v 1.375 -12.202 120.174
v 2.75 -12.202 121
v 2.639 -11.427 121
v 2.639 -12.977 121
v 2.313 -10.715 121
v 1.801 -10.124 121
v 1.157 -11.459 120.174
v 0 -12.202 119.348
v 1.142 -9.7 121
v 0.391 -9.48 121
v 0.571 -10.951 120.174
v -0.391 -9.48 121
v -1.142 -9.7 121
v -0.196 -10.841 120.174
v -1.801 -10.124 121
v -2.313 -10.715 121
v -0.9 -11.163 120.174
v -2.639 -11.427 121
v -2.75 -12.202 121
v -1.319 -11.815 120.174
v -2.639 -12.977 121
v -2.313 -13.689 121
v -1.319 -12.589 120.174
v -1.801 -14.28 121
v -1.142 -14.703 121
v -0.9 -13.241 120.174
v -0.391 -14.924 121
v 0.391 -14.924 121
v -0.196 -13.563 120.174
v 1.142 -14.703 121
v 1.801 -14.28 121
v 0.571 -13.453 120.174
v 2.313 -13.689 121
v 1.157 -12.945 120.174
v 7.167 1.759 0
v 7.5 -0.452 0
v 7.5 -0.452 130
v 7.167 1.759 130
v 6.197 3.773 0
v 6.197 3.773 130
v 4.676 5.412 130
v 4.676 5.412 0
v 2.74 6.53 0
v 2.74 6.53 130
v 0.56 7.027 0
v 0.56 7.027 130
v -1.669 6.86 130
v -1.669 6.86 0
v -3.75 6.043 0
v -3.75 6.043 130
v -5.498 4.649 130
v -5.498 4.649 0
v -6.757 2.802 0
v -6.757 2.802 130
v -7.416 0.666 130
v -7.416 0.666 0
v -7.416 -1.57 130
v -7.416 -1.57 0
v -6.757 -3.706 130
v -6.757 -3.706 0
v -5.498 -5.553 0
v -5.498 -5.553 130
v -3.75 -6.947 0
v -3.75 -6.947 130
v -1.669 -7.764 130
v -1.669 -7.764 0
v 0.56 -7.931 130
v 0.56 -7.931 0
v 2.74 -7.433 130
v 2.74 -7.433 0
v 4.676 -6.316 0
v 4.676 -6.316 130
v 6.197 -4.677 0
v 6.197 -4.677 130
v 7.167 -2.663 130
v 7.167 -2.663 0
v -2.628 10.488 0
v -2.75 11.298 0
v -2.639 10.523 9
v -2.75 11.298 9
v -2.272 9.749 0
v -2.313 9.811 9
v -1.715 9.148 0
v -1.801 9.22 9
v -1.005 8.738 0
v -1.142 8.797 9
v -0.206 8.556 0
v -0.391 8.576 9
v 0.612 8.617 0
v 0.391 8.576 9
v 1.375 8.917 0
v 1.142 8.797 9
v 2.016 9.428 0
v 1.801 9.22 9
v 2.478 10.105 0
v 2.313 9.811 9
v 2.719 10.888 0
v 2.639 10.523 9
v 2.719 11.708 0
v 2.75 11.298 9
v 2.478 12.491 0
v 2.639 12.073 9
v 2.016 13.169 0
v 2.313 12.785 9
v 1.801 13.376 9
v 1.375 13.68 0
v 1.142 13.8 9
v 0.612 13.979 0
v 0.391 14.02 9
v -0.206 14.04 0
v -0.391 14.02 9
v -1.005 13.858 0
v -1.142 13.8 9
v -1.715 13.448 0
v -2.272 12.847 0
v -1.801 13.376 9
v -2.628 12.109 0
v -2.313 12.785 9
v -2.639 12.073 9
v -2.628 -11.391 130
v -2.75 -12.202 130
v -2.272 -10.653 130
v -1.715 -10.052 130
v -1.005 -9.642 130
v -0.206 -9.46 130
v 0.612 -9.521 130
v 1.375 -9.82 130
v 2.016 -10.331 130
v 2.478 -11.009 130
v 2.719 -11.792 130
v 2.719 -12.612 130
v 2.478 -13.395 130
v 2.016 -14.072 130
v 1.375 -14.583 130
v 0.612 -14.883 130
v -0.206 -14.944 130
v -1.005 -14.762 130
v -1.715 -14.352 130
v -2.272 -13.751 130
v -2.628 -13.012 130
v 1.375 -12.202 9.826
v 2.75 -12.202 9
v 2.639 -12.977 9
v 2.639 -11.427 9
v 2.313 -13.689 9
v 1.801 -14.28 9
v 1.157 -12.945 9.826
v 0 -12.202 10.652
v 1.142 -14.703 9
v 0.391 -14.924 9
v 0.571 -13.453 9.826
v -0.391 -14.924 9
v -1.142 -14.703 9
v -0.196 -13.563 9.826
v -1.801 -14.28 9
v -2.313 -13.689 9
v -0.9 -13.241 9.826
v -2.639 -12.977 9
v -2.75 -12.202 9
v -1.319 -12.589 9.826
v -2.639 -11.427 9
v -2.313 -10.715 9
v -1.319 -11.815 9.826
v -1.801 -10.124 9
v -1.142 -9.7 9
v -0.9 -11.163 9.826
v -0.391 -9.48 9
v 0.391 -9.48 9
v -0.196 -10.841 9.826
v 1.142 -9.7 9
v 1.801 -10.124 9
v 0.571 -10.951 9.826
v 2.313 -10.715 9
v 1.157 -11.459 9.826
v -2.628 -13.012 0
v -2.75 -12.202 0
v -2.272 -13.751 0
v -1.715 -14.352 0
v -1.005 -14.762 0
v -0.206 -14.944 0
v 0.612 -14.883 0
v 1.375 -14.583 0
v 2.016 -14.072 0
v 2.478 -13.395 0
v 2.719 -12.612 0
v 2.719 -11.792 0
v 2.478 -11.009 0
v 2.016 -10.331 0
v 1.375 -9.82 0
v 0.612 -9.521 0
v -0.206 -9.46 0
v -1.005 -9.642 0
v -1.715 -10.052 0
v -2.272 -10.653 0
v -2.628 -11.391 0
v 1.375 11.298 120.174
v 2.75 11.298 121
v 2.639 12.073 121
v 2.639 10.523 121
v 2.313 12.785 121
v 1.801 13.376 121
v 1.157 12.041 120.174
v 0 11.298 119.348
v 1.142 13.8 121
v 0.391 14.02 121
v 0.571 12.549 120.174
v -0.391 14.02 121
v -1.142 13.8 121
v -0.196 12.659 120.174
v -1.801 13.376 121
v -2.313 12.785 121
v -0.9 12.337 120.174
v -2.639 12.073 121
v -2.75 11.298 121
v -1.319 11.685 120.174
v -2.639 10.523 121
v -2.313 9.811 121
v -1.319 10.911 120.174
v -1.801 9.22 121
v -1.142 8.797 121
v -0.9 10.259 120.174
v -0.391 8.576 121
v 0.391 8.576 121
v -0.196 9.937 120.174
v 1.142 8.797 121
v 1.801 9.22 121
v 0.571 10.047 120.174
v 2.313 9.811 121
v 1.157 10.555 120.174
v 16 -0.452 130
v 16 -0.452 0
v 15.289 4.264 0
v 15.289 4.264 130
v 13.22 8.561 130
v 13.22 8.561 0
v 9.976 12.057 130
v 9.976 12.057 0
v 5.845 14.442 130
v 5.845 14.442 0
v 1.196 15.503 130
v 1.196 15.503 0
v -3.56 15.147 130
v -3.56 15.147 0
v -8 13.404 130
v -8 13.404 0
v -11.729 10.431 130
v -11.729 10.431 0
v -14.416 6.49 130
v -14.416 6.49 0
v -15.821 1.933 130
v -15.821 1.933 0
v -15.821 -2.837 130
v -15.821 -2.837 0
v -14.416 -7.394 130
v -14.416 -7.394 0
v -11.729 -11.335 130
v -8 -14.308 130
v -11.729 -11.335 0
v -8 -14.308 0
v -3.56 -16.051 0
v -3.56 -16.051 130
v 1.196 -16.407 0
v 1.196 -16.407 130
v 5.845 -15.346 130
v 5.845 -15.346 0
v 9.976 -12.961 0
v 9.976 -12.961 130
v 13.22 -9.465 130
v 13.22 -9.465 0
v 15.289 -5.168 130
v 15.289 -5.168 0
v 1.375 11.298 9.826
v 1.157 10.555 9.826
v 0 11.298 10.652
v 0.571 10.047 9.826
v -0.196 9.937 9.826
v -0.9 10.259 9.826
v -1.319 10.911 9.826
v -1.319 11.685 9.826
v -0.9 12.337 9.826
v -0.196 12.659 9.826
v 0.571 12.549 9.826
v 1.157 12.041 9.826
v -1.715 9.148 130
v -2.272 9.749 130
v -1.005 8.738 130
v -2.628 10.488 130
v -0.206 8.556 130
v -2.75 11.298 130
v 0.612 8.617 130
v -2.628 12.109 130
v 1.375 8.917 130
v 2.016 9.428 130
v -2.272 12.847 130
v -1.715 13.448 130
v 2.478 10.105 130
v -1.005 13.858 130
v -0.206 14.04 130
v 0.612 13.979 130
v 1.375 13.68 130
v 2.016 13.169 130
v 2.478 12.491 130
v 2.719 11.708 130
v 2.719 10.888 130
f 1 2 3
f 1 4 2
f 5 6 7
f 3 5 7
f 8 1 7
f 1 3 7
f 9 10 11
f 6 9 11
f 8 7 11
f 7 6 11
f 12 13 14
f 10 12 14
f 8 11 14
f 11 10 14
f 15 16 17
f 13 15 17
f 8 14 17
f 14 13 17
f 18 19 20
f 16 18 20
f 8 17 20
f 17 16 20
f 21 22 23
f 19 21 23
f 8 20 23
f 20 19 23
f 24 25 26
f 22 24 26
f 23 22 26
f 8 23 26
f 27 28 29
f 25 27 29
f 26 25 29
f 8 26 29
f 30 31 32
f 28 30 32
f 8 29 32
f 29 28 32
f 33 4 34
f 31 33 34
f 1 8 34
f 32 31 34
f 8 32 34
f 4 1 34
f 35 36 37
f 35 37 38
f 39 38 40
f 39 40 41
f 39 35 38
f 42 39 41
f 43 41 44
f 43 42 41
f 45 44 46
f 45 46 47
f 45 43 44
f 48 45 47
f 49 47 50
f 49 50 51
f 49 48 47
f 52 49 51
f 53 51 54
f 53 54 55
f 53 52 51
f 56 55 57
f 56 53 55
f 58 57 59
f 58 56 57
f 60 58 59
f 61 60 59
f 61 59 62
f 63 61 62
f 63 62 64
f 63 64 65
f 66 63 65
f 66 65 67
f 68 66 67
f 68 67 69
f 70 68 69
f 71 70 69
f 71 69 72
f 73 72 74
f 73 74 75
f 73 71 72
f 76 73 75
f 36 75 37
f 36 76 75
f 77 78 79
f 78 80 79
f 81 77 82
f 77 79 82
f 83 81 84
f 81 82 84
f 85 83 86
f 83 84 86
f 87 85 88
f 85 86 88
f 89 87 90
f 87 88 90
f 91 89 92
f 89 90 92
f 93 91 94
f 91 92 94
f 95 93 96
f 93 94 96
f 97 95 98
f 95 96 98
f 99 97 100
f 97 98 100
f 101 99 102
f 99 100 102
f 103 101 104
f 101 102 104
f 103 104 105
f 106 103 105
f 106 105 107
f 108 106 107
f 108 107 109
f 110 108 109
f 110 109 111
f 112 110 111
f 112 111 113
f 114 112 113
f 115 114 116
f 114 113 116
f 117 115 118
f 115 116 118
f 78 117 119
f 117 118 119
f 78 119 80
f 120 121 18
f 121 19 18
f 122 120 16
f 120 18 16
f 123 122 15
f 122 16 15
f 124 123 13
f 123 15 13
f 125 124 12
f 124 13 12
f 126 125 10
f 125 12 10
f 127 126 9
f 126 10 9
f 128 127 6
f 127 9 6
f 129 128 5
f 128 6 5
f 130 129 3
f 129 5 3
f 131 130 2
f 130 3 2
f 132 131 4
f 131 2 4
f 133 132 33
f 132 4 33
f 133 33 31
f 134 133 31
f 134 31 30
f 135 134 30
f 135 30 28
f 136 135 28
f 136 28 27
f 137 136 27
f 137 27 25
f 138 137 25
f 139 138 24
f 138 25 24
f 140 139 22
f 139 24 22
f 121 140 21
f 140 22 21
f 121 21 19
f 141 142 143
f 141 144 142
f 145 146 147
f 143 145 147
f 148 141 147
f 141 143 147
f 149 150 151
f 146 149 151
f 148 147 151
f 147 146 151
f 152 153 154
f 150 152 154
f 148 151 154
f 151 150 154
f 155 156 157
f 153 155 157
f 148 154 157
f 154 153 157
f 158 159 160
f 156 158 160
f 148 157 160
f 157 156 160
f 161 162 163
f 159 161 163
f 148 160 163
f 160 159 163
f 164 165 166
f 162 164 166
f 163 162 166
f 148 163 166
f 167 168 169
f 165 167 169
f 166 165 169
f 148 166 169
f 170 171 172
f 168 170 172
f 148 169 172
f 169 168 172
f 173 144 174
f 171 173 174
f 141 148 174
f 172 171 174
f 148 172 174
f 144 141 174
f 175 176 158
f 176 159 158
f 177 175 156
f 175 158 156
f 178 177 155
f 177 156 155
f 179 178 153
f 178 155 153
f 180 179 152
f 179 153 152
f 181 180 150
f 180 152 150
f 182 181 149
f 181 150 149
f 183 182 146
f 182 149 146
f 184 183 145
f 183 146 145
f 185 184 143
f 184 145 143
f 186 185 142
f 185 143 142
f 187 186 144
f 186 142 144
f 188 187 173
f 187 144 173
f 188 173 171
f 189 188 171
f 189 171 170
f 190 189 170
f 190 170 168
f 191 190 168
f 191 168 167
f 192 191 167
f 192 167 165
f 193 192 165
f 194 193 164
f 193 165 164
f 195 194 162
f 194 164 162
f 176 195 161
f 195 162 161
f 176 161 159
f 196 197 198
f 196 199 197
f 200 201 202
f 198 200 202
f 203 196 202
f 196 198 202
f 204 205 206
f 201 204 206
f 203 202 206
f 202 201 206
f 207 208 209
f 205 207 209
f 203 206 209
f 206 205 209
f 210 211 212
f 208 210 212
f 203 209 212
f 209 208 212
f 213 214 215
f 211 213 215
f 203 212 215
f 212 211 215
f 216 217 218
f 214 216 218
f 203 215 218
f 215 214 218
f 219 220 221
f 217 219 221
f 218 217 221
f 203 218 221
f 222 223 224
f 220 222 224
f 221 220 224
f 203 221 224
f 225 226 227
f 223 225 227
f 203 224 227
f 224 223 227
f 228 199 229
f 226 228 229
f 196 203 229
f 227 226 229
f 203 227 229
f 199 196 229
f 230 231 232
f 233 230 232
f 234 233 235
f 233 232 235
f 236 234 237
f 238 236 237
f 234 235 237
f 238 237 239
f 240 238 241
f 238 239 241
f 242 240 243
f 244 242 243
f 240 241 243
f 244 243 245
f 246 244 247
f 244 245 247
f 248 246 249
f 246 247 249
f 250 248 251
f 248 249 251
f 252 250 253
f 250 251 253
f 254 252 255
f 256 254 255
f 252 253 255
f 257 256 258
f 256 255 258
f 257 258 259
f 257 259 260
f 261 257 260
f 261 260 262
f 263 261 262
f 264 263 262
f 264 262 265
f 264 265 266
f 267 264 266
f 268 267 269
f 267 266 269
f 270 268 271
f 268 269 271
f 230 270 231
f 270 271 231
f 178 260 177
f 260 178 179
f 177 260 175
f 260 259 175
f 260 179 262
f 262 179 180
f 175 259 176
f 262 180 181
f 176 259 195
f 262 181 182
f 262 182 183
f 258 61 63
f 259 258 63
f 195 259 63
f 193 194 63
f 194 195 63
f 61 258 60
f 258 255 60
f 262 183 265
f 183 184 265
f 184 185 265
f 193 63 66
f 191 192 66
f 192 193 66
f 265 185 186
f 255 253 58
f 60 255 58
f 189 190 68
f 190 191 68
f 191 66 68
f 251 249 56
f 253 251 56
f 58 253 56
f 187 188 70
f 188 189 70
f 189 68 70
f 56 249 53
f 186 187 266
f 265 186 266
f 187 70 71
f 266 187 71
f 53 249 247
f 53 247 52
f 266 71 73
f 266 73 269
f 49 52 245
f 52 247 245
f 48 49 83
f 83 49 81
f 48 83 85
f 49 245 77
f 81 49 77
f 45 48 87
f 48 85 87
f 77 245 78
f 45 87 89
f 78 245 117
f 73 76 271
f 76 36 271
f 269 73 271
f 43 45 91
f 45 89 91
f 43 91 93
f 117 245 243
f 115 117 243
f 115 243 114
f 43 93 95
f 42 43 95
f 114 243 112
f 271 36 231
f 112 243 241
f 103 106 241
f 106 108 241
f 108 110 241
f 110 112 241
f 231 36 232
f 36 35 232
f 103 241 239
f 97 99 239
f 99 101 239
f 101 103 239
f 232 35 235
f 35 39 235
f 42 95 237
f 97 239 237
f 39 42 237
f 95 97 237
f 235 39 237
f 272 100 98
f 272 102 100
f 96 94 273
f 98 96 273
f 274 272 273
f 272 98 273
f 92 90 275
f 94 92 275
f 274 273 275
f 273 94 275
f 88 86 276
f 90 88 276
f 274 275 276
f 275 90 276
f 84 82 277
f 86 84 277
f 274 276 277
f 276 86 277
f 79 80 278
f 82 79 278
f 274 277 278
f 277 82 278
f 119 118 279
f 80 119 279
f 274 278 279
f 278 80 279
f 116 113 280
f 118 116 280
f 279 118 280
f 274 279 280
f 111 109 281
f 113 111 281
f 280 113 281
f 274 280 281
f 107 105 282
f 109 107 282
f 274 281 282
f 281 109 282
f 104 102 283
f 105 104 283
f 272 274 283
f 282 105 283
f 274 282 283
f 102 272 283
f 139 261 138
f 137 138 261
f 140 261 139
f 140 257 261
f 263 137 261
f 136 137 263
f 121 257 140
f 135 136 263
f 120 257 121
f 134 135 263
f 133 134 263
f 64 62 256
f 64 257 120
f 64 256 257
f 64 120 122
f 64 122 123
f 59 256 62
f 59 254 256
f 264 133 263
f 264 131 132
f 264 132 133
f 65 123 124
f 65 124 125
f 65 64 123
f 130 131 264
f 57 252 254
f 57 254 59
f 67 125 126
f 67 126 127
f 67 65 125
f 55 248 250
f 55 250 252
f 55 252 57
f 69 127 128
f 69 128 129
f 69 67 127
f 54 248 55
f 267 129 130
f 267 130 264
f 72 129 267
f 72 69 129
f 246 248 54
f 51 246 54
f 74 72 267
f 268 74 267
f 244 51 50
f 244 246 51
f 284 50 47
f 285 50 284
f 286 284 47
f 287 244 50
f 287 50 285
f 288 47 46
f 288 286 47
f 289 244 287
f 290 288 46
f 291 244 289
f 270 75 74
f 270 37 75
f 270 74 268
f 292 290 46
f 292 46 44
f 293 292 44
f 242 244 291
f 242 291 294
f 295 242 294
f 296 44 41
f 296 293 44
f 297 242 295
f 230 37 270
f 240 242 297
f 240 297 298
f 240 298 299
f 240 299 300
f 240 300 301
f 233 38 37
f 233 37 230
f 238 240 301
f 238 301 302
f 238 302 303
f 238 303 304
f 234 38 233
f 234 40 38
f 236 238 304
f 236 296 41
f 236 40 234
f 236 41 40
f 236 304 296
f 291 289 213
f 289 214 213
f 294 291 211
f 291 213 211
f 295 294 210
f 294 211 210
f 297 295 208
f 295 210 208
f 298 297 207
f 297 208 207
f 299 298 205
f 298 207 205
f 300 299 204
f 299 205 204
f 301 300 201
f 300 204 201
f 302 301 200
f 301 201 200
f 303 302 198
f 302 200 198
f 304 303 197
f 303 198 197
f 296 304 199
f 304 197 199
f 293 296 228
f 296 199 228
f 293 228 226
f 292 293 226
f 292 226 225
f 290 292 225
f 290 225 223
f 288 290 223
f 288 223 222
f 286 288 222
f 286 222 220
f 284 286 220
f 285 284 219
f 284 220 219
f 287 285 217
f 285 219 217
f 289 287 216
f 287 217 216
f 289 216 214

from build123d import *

# Parameters (mm, degrees)
F0_R     = 16
F0_R_2   = 7.5
F1_DEPTH = 130
F3_D     = 5.5
F3_DEPTH = 9
F3_TIP   = 1.6523667023
F4_D     = 5.5
F4_DEPTH = 9
F4_TIP   = 1.6523667023
F6_D     = 5.5
F6_DEPTH = 9
F6_TIP   = 1.6523667023
F7_D     = 5.5
F7_DEPTH = 9
F7_TIP   = 1.6523667023


with BuildPart() as f1:
    # F0 (on Top) → F1 (new body)
    with BuildSketch(Plane.XY):
        with Locations((0, -0.4519075282)):
            Circle(F0_R)
        with Locations((0, -0.4519075282)):
            Circle(F0_R_2, mode=Mode.SUBTRACT)
    extrude(amount=F1_DEPTH)

    # F3
    with Locations(Plane.XY.offset(130)):
        with Locations((0, 11.2980924718)):
            Hole(F3_D / 2, depth=F3_DEPTH)
            with Locations((0, 0, -(F3_DEPTH + F3_TIP / 2))):  # 118° drill point
                Cone(0, F3_D / 2, F3_TIP, mode=Mode.SUBTRACT)

    # F4
    with Locations(Plane.XY.offset(130)):
        with Locations((0, -12.2019075282)):
            Hole(F4_D / 2, depth=F4_DEPTH)
            with Locations((0, 0, -(F4_DEPTH + F4_TIP / 2))):  # 118° drill point
                Cone(0, F4_D / 2, F4_TIP, mode=Mode.SUBTRACT)

    # F6
    with Locations(Plane(origin=(0, 0, 0), x_dir=(1, 0, 0), z_dir=(0, 0, -1))):
        with Locations((0, -11.2980924718)):
            Hole(F6_D / 2, depth=F6_DEPTH)
            with Locations((0, 0, -(F6_DEPTH + F6_TIP / 2))):  # 118° drill point
                Cone(0, F6_D / 2, F6_TIP, mode=Mode.SUBTRACT)

    # F7
    with Locations(Plane(origin=(0, 0, 0), x_dir=(1, 0, 0), z_dir=(0, 0, -1))):
        with Locations((0, 12.2019075282)):
            Hole(F7_D / 2, depth=F7_DEPTH)
            with Locations((0, 0, -(F7_DEPTH + F7_TIP / 2))):  # 118° drill point
                Cone(0, F7_D / 2, F7_TIP, mode=Mode.SUBTRACT)


solid = f1.part
